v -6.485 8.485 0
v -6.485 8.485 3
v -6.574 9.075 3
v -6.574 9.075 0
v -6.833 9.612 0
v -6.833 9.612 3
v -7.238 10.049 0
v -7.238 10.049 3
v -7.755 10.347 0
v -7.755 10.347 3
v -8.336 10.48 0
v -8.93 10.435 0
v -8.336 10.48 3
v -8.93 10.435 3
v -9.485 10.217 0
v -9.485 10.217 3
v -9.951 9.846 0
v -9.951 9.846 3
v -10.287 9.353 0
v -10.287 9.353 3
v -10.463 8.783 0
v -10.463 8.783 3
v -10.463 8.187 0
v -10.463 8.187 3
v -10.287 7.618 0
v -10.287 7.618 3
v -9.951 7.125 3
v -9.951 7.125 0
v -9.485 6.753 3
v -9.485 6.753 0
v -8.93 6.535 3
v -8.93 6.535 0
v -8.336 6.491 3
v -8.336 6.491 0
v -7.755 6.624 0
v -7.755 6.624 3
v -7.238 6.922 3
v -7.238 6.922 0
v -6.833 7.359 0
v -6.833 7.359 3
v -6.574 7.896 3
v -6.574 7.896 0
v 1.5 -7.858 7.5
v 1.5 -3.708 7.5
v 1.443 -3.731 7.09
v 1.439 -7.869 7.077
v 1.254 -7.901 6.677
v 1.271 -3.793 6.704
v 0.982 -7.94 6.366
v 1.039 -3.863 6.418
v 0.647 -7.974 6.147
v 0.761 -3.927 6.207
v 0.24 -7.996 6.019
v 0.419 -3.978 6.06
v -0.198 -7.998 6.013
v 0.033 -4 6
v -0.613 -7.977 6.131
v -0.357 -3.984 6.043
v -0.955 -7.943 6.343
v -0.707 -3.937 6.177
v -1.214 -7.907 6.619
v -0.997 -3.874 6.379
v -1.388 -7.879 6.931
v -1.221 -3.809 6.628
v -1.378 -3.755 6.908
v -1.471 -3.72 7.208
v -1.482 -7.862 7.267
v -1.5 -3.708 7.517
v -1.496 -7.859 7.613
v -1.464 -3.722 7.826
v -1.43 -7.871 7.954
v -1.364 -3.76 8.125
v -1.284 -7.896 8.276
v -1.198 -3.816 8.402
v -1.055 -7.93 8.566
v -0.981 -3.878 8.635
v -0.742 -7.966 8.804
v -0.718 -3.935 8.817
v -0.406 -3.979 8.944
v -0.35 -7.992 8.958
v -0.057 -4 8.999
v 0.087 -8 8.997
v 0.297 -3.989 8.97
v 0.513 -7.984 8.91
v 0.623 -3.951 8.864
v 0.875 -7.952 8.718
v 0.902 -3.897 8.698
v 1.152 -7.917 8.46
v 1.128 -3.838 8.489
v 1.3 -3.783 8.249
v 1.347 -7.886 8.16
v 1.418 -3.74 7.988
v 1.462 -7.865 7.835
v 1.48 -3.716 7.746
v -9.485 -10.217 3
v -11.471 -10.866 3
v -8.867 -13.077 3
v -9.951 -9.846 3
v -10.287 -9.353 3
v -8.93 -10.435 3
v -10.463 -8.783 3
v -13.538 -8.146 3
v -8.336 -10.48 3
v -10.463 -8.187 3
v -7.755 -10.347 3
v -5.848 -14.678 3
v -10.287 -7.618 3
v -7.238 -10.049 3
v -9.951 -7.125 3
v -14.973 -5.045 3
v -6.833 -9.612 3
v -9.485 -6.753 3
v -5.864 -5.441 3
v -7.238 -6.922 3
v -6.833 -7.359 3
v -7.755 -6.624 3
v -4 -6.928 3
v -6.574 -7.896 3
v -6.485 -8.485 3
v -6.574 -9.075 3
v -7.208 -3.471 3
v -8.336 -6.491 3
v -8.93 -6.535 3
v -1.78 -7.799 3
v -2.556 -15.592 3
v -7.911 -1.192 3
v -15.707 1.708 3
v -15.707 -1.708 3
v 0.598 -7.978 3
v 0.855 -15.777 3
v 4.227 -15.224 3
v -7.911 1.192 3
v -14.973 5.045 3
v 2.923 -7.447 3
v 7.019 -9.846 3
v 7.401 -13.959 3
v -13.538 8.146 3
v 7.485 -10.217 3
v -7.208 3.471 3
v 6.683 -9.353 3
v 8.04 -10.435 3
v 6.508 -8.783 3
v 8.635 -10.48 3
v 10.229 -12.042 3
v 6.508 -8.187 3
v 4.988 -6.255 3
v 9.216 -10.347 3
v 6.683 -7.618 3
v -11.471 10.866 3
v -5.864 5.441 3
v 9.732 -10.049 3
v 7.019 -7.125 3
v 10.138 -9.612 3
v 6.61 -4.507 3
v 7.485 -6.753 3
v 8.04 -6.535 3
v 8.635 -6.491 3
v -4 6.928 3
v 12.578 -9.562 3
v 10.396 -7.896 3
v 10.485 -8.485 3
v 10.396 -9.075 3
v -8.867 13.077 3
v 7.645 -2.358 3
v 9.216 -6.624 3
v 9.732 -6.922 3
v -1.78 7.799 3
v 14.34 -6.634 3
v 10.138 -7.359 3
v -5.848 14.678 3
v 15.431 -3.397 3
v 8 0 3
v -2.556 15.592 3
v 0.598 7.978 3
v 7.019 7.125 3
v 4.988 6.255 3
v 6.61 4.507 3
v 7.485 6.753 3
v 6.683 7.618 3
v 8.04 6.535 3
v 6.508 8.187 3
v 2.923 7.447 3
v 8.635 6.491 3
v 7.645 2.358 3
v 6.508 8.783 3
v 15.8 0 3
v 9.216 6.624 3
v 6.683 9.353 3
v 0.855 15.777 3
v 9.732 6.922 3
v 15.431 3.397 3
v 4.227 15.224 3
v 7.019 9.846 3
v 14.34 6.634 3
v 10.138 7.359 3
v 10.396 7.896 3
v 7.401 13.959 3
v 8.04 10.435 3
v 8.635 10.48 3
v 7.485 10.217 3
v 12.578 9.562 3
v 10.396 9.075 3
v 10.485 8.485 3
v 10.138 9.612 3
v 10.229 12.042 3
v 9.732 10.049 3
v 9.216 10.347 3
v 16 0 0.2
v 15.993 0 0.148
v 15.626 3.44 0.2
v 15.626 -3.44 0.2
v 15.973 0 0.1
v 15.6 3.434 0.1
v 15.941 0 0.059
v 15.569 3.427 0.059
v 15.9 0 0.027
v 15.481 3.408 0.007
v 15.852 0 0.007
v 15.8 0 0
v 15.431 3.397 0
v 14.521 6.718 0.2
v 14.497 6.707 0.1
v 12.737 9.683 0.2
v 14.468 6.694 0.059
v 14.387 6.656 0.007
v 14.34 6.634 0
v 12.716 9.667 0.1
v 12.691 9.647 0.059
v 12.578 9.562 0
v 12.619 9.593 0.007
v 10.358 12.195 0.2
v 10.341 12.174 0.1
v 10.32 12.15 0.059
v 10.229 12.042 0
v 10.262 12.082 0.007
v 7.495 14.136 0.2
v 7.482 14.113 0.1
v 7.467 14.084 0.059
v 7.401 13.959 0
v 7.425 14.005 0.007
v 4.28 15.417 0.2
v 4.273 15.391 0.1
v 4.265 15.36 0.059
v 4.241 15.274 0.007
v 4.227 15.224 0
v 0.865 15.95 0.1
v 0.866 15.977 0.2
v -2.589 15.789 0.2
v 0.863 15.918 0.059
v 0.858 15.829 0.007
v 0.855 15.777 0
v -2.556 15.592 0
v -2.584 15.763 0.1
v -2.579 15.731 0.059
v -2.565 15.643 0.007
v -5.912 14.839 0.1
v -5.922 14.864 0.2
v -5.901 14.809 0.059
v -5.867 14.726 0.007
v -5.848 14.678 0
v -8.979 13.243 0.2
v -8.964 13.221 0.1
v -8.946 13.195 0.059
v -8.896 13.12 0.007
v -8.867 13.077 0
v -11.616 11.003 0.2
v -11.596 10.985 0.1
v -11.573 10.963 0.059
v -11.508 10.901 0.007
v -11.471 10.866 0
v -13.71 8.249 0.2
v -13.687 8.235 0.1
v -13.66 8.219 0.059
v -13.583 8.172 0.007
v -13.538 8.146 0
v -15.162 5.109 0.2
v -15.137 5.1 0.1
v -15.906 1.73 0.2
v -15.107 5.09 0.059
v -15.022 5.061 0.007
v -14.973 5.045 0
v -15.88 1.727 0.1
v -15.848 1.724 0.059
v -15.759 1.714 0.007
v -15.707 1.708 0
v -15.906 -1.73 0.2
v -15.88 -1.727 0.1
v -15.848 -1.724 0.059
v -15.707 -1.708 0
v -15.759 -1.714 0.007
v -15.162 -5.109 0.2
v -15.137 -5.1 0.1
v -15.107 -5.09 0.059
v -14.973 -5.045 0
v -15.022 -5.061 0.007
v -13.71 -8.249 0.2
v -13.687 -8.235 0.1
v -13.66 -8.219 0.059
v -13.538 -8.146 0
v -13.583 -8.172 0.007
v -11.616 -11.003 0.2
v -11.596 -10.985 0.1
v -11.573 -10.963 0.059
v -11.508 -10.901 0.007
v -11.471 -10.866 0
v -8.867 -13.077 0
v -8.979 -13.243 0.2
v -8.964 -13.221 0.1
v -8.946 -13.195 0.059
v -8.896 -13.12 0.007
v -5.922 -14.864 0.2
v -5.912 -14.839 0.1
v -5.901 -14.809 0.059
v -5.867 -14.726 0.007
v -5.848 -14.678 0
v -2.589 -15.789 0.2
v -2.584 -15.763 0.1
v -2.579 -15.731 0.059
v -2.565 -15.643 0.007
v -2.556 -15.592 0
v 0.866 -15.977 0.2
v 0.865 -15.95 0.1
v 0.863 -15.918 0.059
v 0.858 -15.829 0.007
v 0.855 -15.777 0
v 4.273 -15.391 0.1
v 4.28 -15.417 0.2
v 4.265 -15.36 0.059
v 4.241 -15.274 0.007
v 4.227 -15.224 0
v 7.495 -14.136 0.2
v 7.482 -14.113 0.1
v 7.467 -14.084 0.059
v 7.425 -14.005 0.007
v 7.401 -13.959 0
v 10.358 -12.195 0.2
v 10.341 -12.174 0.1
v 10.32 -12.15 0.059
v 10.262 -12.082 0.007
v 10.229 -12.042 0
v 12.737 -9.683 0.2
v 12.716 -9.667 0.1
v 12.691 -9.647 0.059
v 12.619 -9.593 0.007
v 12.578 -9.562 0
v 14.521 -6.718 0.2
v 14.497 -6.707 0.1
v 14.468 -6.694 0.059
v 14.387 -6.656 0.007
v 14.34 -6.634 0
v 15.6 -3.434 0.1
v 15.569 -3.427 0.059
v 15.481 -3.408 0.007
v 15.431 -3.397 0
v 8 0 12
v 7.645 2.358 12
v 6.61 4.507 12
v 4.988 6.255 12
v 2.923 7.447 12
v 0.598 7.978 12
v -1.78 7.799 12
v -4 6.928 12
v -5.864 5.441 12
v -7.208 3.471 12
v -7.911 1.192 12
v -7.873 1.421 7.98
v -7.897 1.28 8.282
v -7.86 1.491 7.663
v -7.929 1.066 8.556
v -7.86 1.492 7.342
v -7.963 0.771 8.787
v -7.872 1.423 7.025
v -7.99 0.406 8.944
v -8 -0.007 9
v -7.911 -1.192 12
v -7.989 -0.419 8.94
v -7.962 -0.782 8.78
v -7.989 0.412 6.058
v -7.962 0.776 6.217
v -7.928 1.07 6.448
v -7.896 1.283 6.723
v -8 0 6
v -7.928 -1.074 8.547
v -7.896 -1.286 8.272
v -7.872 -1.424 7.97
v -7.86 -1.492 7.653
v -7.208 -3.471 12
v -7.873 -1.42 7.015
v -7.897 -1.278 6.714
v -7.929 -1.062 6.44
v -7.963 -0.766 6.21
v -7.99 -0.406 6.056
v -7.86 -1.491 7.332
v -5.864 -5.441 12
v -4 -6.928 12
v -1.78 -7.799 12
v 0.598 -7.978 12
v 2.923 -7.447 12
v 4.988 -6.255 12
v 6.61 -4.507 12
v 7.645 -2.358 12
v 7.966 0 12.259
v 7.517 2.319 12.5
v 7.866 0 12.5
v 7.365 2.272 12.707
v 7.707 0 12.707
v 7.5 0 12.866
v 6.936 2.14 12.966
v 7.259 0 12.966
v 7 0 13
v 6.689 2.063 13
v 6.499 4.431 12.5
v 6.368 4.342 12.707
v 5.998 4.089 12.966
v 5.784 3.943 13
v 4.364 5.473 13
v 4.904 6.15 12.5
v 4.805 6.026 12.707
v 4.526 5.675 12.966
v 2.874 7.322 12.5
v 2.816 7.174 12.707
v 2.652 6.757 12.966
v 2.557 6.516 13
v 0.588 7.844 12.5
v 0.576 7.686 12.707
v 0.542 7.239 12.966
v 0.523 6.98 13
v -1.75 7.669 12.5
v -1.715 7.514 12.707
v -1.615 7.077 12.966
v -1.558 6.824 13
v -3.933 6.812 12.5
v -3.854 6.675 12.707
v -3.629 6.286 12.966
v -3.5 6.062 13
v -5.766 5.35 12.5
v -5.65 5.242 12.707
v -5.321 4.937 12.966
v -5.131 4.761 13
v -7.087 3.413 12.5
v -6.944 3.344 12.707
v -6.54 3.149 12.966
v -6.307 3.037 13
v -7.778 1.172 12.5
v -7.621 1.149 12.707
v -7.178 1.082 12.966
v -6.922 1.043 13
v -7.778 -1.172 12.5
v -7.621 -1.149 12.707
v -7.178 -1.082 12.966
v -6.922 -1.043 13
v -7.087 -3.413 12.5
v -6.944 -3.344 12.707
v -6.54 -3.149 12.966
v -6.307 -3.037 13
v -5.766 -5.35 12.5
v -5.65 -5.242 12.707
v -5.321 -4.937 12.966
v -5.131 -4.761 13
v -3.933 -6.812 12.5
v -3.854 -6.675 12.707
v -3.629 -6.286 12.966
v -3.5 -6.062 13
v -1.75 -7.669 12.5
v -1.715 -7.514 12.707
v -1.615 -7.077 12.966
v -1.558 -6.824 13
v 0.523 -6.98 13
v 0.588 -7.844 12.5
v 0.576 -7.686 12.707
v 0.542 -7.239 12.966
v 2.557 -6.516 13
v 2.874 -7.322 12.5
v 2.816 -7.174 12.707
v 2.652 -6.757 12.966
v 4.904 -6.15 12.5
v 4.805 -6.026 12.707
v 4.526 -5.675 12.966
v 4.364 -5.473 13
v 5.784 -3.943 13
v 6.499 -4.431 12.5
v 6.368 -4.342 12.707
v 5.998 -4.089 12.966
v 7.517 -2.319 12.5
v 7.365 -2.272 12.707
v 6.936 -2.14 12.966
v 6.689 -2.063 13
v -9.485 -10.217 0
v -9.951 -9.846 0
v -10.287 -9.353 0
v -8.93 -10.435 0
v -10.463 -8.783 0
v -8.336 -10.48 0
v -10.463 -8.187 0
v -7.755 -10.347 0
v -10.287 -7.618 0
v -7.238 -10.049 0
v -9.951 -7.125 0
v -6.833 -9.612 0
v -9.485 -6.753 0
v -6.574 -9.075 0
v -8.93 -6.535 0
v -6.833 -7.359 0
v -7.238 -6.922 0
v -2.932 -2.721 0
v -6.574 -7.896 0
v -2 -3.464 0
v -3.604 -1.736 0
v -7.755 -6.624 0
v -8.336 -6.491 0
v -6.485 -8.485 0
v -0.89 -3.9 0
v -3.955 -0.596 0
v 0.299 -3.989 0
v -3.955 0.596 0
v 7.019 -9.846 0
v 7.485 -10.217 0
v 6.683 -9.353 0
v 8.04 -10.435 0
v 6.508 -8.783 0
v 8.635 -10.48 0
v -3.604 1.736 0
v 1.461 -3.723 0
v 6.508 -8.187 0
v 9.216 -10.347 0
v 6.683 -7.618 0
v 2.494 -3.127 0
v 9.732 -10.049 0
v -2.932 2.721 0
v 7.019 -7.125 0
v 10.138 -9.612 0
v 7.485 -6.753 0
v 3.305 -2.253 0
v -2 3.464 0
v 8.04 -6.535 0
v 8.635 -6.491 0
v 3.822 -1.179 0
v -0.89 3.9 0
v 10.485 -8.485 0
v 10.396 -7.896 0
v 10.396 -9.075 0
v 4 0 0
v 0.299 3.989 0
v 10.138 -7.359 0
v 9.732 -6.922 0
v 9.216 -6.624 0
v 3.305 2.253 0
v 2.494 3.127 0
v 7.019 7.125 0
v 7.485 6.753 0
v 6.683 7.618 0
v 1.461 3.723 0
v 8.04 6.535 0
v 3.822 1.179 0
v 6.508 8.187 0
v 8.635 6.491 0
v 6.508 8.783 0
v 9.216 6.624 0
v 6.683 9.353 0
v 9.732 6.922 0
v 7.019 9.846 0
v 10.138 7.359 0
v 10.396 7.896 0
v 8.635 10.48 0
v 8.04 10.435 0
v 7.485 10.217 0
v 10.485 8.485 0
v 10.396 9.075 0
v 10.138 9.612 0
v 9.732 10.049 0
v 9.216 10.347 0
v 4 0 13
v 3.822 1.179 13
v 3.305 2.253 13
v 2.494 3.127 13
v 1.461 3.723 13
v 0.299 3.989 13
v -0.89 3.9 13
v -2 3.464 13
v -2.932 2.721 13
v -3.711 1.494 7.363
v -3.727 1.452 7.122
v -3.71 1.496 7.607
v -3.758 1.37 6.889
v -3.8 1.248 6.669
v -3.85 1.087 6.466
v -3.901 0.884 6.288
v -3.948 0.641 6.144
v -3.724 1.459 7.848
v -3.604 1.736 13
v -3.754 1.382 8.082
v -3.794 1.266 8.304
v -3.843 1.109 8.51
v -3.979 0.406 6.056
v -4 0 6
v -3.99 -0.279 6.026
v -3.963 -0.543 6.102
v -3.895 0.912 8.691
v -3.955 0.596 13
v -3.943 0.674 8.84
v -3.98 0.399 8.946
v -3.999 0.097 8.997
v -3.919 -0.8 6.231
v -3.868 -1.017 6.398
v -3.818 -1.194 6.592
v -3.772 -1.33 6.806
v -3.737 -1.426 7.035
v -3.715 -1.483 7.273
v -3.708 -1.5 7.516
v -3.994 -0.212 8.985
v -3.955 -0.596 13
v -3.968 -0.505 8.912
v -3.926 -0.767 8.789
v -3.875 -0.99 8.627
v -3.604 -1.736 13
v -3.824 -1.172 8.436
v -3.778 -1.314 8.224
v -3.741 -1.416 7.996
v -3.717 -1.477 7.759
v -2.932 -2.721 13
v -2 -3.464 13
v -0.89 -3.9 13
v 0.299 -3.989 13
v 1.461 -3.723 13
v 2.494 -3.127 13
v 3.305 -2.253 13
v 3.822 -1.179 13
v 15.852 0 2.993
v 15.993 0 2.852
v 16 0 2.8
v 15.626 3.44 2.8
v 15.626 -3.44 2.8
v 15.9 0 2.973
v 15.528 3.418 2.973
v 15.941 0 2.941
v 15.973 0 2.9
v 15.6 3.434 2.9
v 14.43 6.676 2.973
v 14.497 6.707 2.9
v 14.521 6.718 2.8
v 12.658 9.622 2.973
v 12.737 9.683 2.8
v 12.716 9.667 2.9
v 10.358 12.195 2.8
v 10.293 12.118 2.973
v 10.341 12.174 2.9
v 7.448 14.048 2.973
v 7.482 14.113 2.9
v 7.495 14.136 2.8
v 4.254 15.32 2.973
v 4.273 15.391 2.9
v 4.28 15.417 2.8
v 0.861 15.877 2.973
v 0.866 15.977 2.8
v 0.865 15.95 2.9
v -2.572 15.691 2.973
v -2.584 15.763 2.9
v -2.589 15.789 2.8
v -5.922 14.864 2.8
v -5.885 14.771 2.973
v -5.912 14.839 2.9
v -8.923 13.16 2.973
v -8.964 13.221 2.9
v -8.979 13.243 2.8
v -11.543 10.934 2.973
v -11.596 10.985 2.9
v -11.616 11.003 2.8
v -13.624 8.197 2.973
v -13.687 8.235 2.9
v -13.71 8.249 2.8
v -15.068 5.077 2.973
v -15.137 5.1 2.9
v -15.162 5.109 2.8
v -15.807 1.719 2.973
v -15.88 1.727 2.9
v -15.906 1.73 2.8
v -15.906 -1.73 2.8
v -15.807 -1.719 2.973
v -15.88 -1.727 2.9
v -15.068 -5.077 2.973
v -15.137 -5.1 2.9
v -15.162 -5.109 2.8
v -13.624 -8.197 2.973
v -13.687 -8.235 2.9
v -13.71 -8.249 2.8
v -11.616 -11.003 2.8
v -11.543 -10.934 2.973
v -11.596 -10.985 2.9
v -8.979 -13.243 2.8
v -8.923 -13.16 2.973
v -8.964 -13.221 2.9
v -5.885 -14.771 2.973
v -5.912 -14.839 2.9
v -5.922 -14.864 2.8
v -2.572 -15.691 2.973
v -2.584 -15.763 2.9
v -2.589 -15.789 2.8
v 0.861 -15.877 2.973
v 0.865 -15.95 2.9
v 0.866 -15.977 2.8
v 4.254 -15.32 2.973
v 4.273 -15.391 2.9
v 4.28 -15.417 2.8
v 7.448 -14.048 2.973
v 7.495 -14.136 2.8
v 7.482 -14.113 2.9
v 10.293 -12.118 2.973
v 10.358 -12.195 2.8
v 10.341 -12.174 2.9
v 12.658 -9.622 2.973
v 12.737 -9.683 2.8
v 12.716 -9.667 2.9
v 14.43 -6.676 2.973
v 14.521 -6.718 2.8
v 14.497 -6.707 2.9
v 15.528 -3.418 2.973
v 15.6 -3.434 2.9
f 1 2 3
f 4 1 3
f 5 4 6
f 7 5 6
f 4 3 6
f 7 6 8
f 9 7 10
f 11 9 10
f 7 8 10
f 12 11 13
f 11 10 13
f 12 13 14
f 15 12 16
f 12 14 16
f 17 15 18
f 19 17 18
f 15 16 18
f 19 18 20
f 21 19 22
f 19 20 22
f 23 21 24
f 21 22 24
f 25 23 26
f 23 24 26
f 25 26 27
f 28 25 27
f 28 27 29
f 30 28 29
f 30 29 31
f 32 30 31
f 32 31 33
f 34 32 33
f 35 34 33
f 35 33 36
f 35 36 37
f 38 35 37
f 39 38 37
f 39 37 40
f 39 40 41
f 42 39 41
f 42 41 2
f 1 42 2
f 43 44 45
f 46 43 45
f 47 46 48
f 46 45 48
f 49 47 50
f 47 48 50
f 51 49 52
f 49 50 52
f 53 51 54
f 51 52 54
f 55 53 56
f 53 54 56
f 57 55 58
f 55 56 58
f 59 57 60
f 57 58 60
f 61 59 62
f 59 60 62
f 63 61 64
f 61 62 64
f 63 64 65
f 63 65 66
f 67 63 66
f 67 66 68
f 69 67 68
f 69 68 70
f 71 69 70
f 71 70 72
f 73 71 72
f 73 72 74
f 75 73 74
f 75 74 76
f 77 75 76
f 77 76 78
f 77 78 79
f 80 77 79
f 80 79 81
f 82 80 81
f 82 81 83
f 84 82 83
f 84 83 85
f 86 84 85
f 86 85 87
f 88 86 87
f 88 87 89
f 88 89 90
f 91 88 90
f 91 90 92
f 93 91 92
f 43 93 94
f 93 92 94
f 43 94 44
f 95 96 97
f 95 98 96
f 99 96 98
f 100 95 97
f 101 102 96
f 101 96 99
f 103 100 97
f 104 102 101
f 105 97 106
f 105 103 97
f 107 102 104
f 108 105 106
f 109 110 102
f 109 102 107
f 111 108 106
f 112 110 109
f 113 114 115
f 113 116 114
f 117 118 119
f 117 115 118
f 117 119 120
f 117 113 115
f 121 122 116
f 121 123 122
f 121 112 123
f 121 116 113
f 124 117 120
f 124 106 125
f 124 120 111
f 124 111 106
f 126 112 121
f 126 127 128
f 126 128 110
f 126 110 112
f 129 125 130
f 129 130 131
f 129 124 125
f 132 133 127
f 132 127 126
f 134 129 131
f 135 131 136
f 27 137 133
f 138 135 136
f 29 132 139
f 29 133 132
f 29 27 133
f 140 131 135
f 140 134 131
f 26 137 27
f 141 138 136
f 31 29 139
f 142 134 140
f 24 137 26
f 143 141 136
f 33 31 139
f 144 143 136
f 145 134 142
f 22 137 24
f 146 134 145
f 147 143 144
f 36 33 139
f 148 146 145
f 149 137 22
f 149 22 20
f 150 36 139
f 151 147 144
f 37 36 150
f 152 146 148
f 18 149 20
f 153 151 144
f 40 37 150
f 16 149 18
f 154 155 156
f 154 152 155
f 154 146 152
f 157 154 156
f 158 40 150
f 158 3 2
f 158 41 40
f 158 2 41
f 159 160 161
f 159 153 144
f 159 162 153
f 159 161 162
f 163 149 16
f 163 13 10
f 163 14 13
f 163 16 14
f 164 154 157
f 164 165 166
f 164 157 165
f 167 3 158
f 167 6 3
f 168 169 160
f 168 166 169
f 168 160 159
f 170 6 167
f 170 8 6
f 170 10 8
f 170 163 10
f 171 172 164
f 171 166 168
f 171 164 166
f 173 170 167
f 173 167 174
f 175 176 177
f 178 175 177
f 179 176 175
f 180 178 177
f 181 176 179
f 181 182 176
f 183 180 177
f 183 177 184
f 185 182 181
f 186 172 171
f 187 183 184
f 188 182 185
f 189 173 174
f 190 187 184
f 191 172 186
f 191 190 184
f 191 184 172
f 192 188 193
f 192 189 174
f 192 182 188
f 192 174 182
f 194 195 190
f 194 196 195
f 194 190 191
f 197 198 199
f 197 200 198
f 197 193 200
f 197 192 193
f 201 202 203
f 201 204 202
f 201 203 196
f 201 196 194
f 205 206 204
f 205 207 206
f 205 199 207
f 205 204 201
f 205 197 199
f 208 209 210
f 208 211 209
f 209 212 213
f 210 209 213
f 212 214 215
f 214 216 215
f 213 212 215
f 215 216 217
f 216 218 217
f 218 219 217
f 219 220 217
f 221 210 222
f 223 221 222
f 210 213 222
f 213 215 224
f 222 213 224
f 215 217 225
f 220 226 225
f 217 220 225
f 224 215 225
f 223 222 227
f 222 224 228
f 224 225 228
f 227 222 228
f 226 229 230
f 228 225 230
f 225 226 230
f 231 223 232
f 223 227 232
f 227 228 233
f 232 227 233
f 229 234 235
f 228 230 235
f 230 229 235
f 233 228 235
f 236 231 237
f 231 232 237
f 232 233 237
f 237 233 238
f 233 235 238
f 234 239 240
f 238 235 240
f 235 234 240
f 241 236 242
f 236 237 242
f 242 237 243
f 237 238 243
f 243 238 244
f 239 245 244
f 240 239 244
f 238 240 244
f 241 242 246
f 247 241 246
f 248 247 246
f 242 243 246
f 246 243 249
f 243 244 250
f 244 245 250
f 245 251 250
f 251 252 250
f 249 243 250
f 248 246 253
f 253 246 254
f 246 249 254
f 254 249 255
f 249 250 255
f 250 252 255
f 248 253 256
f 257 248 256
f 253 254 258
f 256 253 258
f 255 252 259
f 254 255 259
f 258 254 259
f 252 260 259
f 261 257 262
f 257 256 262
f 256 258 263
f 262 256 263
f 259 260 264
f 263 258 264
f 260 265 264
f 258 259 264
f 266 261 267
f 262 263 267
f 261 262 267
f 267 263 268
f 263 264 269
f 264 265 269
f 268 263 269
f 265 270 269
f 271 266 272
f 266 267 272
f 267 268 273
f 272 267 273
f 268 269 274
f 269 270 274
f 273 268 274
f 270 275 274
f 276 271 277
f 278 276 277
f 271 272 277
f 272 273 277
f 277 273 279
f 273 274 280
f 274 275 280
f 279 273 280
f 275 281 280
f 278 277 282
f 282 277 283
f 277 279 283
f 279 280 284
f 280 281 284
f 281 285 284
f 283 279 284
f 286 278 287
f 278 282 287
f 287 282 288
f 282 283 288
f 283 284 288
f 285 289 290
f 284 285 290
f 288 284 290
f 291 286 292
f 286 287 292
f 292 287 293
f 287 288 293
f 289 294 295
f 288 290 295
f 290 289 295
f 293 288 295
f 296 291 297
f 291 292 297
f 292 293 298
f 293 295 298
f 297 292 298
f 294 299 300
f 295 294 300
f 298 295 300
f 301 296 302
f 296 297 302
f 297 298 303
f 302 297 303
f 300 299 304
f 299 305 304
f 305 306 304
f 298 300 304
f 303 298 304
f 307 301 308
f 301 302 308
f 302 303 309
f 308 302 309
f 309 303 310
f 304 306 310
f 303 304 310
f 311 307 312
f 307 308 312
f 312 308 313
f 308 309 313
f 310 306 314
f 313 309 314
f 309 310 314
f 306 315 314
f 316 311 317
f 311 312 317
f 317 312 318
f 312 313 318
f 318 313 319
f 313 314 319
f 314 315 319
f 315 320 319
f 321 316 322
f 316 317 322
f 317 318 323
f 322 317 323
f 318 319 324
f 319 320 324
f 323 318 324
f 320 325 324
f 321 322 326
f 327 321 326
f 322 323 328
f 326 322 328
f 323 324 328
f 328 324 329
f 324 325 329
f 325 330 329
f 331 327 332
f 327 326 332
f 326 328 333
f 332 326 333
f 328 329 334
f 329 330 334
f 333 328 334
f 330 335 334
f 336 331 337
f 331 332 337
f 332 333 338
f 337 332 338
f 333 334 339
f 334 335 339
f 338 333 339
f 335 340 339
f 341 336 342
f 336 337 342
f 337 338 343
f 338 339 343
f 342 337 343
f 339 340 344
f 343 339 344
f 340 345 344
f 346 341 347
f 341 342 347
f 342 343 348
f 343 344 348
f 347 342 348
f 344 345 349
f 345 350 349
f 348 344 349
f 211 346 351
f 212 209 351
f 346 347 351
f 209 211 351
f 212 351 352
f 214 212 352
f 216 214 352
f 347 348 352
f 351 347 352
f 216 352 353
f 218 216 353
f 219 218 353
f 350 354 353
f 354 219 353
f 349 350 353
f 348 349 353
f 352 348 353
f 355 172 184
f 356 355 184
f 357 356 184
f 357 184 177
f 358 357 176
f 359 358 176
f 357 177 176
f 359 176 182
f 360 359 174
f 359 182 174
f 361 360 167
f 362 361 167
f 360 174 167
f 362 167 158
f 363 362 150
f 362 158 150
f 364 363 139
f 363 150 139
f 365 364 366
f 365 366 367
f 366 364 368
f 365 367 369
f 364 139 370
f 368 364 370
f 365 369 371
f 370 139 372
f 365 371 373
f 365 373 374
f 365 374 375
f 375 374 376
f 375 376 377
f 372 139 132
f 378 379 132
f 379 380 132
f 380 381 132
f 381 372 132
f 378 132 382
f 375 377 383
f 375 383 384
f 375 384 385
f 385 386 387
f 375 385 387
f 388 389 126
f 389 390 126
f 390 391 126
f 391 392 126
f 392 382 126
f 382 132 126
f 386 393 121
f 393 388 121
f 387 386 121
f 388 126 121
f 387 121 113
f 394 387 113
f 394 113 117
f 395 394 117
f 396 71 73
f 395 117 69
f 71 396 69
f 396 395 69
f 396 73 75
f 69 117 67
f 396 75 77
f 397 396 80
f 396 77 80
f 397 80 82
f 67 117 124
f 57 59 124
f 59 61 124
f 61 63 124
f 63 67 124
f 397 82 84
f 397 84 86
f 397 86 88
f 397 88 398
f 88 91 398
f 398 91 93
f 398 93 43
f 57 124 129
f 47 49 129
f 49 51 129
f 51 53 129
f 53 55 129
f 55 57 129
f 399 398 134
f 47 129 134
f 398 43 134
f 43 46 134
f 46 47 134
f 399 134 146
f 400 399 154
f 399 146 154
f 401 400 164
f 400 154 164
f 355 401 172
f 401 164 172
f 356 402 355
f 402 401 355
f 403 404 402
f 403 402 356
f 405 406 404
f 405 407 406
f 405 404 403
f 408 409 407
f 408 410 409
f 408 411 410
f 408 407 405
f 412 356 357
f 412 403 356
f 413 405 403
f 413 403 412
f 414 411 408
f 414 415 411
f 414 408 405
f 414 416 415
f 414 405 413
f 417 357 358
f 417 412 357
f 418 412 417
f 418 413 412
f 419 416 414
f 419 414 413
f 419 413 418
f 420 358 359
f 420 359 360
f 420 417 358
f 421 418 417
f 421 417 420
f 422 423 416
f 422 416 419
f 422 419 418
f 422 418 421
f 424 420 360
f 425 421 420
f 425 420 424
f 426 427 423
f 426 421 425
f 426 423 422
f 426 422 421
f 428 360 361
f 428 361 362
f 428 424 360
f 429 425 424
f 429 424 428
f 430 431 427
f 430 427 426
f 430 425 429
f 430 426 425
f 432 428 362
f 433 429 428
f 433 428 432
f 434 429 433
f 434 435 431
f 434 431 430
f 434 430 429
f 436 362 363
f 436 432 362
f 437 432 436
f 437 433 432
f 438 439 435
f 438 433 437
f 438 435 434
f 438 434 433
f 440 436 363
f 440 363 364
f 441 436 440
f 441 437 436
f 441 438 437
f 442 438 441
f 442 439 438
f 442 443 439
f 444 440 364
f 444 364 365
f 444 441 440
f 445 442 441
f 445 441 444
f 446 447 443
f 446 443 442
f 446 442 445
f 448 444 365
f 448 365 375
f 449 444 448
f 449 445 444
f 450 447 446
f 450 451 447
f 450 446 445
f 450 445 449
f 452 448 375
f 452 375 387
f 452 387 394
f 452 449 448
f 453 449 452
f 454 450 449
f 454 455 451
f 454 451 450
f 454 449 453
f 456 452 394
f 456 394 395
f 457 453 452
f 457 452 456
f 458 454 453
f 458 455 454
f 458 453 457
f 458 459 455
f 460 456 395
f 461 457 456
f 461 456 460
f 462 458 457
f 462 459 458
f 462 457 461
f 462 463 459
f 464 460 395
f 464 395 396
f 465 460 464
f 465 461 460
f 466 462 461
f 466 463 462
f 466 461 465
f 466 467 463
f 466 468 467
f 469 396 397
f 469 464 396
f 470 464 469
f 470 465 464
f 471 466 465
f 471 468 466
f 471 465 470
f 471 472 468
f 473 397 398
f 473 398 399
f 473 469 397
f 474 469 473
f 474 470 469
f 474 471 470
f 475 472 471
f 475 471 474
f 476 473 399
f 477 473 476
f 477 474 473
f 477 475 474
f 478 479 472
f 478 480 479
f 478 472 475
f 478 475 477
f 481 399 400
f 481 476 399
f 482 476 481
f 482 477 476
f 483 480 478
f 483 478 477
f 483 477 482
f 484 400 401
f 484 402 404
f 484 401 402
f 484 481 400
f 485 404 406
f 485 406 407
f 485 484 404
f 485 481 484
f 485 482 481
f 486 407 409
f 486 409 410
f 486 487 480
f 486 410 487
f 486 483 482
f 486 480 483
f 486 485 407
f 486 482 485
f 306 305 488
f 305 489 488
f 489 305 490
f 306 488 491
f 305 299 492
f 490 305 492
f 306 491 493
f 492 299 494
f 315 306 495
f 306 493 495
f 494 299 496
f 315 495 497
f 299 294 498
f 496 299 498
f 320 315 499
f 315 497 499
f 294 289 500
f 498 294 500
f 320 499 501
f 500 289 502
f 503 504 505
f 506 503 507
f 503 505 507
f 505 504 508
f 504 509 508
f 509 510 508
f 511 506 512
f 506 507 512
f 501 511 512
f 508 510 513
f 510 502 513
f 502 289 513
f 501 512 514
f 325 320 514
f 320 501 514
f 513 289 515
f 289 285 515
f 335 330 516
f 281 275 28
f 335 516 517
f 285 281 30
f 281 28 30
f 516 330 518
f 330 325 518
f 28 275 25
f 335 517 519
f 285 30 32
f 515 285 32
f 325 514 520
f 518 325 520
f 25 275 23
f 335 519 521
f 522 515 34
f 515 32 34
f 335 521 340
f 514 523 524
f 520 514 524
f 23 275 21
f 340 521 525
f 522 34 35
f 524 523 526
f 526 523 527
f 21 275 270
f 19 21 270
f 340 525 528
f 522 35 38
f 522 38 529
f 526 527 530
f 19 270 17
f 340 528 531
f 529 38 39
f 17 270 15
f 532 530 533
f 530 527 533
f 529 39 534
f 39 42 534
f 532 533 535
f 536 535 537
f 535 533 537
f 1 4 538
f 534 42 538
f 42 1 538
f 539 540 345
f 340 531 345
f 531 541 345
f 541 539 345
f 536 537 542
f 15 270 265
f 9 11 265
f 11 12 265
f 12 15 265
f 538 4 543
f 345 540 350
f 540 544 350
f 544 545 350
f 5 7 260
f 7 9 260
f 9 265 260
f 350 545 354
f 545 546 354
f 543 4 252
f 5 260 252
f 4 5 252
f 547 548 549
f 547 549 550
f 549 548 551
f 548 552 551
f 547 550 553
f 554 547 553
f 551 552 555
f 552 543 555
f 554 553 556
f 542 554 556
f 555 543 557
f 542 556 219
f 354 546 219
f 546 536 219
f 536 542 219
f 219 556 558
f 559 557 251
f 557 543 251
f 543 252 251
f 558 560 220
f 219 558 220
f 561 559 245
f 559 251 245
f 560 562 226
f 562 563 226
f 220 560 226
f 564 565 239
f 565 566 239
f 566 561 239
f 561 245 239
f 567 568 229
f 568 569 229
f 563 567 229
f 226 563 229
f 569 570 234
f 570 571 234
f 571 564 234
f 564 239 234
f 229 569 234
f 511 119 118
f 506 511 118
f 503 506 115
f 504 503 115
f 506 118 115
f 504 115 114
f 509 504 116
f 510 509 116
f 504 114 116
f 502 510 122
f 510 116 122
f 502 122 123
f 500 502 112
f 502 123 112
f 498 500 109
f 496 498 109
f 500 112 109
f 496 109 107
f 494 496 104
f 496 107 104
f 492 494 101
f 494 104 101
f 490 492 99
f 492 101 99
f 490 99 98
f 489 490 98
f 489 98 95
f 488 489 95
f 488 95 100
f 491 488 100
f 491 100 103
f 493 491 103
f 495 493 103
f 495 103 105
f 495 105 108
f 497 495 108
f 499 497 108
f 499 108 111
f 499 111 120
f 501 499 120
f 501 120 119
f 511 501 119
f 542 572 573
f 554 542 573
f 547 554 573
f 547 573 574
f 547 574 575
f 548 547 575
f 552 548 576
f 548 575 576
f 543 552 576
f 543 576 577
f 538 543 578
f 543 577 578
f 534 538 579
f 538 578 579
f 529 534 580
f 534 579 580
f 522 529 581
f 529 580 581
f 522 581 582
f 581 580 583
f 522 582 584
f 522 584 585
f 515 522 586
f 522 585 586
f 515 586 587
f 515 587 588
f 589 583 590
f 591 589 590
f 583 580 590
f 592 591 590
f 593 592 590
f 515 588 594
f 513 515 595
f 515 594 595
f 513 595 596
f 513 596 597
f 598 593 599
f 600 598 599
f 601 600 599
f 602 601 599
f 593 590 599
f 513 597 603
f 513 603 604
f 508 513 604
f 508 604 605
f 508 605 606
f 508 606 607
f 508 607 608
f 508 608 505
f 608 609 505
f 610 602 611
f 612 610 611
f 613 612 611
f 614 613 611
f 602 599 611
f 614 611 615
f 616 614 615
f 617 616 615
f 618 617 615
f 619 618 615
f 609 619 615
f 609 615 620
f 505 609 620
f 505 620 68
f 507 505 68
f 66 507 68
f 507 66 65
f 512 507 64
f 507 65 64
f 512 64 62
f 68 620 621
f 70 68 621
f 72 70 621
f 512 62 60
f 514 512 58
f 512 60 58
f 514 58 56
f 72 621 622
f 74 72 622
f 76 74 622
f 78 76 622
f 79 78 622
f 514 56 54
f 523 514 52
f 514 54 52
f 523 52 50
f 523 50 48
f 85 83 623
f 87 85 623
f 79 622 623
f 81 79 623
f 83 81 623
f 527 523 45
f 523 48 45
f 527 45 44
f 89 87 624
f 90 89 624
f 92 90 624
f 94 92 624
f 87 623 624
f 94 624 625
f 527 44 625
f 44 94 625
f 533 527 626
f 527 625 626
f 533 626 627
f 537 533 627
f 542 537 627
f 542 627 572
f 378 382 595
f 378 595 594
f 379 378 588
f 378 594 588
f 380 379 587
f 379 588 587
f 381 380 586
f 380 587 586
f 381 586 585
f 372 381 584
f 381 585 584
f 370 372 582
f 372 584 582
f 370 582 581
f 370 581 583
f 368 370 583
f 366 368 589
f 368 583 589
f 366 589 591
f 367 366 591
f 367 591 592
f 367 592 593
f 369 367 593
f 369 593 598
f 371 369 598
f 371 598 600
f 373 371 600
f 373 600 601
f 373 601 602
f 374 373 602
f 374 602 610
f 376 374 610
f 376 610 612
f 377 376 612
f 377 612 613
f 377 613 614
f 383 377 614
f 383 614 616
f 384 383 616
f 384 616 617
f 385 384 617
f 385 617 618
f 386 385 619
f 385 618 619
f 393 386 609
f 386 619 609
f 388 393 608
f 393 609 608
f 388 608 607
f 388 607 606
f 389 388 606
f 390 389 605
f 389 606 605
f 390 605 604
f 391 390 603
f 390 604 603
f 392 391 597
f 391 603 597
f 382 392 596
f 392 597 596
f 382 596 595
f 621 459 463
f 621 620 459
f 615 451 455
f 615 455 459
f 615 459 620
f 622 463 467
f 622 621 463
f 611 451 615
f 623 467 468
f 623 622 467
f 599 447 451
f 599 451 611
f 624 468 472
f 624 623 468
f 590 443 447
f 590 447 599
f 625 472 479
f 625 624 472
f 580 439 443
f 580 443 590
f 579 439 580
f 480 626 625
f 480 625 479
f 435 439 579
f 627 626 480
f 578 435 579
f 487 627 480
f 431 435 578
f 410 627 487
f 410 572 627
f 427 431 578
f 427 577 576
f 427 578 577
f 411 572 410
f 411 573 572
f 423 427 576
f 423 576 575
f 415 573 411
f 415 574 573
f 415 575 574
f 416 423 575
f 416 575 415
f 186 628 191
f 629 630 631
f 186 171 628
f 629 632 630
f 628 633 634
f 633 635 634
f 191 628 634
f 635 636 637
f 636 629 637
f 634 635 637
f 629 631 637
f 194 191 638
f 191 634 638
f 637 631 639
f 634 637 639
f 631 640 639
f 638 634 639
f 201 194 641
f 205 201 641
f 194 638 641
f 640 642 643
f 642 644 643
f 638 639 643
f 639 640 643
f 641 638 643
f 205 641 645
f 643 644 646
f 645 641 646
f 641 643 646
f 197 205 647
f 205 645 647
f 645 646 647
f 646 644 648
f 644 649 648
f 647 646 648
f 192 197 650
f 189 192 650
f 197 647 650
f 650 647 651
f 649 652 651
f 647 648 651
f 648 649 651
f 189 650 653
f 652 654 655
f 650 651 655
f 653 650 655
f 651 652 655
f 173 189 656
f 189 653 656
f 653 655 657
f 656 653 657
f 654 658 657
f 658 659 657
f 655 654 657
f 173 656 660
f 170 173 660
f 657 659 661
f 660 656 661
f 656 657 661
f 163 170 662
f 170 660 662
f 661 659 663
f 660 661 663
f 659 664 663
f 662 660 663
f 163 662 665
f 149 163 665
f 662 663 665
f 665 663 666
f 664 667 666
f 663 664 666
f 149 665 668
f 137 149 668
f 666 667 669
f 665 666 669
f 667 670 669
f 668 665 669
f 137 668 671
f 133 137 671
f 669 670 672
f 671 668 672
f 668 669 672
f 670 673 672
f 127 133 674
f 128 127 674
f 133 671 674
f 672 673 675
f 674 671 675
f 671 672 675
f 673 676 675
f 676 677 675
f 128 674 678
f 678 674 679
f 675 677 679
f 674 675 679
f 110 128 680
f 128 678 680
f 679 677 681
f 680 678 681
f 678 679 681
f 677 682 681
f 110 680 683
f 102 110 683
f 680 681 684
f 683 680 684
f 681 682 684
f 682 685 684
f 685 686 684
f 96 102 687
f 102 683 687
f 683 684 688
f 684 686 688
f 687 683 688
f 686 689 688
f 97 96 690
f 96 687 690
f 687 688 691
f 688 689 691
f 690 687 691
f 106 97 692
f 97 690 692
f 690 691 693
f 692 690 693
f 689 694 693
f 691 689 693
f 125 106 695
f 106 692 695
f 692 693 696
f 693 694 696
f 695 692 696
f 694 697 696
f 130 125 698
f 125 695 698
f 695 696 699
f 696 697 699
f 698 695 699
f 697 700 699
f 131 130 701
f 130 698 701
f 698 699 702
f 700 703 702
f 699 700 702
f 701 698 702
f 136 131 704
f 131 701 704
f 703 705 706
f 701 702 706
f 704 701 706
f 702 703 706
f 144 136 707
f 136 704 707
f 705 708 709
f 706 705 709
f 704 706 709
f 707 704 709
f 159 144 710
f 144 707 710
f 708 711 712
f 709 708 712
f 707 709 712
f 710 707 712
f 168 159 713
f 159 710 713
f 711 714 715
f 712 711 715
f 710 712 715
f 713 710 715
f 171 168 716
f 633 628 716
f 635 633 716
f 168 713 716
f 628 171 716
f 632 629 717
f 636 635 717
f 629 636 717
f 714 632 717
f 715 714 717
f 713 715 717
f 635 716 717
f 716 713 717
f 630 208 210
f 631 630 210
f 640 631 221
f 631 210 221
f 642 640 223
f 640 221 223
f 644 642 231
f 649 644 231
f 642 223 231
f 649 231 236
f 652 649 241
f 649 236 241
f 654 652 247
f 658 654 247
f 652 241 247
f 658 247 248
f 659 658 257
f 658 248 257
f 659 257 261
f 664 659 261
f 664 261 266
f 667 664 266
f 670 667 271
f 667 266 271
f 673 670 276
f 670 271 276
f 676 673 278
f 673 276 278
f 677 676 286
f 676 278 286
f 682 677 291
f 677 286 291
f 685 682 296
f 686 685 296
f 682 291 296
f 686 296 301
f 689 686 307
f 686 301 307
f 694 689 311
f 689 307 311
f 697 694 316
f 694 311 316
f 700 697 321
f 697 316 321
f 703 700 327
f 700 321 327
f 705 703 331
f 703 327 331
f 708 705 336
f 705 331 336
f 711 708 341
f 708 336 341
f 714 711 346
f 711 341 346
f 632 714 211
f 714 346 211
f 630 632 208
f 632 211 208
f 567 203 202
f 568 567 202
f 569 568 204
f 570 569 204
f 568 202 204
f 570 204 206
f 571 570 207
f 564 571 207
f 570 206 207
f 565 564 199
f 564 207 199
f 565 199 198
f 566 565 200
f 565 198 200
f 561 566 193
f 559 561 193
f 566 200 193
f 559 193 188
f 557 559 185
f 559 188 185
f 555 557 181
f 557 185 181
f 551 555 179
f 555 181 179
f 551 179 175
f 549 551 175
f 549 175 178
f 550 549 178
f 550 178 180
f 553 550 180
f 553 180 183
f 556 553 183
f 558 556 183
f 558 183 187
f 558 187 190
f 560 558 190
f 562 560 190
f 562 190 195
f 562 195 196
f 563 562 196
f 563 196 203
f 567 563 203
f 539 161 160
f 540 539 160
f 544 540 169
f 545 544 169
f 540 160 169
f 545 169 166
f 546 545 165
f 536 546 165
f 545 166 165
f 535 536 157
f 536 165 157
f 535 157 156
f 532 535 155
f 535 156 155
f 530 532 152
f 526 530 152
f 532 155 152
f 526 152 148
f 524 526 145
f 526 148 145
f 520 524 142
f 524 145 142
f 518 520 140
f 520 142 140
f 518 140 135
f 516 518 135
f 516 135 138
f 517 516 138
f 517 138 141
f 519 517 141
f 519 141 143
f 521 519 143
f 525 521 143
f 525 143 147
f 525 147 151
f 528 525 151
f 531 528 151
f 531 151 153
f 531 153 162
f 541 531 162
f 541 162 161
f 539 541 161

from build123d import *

# Parameters (mm, degrees)
SKETCH1_R           = 16
BOSS_EXTRUDE1_DEPTH = 3
SKETCH2_R           = 8
BOSS_EXTRUDE2_DEPTH = 10
SKETCH3_R           = 4
CUT_EXTRUDE1_DEPTH  = 14
SKETCH4_R           = 2
CUT_EXTRUDE2_DEPTH  = 4
FILLET1_R           = 1
SKETCH5_R           = 1.5
CUT_EXTRUDE3_DEPTH  = 9
SKETCH6_R           = 1.5
CUT_EXTRUDE4_DEPTH  = 9
FILLET2_R           = 0.2


with BuildPart() as part:
    # Sketch1 → Boss-Extrude1 (new body)
    with BuildSketch(Plane.XY):
        Circle(SKETCH1_R)
    extrude(amount=BOSS_EXTRUDE1_DEPTH)

    # Sketch2 → Boss-Extrude2 (add)
    with BuildSketch(Plane.XY.offset(3)):
        Circle(SKETCH2_R)
    extrude(amount=BOSS_EXTRUDE2_DEPTH)

    # Sketch3 → Cut-Extrude1 (cut, through all)
    with BuildSketch(Plane.XY.offset(13)):
        Circle(SKETCH3_R)
    extrude(amount=-CUT_EXTRUDE1_DEPTH, mode=Mode.SUBTRACT)

    # Sketch4 → Cut-Extrude2 (cut, through all)
    with BuildSketch(Plane.XY.offset(3)):
        with Locations((-8.485281374, 8.485281374)):
            Circle(SKETCH4_R)
        with Locations((8.485281374, 8.485281374)):
            Circle(SKETCH4_R)
        with Locations((8.485281374, -8.485281374)):
            Circle(SKETCH4_R)
        with Locations((-8.485281374, -8.485281374)):
            Circle(SKETCH4_R)
    extrude(amount=-CUT_EXTRUDE2_DEPTH, mode=Mode.SUBTRACT)

    # Fillet1
    fillet1_edges = [part.edges().sort_by_distance(p)[0] for p in [
        (-8, 0, 13),
    ]]
    fillet(fillet1_edges, radius=FILLET1_R)

    # Sketch5 → Cut-Extrude3 (cut)
    with BuildSketch(Plane(origin=(0, 0, 0), x_dir=(0, 0, -1), z_dir=(1, 0, 0))):
        with Locations((-7.5, 0)):
            Circle(SKETCH5_R)
    extrude(amount=-CUT_EXTRUDE3_DEPTH, mode=Mode.SUBTRACT)

    # Sketch6 → Cut-Extrude4 (cut)
    with BuildSketch(Plane(origin=(0, 0, 0), x_dir=(1, 0, 0), z_dir=(0, 1, 0))):
        with Locations((0, -7.5)):
            Circle(SKETCH6_R)
    extrude(amount=-CUT_EXTRUDE4_DEPTH, mode=Mode.SUBTRACT)

    # Fillet2
    fillet2_edges = [part.edges().sort_by_distance(p)[0] for p in [
        (-16, 0, 0),
        (-16, 0, 3),
    ]]
    fillet(fillet2_edges, radius=FILLET2_R)


solid = part.part
